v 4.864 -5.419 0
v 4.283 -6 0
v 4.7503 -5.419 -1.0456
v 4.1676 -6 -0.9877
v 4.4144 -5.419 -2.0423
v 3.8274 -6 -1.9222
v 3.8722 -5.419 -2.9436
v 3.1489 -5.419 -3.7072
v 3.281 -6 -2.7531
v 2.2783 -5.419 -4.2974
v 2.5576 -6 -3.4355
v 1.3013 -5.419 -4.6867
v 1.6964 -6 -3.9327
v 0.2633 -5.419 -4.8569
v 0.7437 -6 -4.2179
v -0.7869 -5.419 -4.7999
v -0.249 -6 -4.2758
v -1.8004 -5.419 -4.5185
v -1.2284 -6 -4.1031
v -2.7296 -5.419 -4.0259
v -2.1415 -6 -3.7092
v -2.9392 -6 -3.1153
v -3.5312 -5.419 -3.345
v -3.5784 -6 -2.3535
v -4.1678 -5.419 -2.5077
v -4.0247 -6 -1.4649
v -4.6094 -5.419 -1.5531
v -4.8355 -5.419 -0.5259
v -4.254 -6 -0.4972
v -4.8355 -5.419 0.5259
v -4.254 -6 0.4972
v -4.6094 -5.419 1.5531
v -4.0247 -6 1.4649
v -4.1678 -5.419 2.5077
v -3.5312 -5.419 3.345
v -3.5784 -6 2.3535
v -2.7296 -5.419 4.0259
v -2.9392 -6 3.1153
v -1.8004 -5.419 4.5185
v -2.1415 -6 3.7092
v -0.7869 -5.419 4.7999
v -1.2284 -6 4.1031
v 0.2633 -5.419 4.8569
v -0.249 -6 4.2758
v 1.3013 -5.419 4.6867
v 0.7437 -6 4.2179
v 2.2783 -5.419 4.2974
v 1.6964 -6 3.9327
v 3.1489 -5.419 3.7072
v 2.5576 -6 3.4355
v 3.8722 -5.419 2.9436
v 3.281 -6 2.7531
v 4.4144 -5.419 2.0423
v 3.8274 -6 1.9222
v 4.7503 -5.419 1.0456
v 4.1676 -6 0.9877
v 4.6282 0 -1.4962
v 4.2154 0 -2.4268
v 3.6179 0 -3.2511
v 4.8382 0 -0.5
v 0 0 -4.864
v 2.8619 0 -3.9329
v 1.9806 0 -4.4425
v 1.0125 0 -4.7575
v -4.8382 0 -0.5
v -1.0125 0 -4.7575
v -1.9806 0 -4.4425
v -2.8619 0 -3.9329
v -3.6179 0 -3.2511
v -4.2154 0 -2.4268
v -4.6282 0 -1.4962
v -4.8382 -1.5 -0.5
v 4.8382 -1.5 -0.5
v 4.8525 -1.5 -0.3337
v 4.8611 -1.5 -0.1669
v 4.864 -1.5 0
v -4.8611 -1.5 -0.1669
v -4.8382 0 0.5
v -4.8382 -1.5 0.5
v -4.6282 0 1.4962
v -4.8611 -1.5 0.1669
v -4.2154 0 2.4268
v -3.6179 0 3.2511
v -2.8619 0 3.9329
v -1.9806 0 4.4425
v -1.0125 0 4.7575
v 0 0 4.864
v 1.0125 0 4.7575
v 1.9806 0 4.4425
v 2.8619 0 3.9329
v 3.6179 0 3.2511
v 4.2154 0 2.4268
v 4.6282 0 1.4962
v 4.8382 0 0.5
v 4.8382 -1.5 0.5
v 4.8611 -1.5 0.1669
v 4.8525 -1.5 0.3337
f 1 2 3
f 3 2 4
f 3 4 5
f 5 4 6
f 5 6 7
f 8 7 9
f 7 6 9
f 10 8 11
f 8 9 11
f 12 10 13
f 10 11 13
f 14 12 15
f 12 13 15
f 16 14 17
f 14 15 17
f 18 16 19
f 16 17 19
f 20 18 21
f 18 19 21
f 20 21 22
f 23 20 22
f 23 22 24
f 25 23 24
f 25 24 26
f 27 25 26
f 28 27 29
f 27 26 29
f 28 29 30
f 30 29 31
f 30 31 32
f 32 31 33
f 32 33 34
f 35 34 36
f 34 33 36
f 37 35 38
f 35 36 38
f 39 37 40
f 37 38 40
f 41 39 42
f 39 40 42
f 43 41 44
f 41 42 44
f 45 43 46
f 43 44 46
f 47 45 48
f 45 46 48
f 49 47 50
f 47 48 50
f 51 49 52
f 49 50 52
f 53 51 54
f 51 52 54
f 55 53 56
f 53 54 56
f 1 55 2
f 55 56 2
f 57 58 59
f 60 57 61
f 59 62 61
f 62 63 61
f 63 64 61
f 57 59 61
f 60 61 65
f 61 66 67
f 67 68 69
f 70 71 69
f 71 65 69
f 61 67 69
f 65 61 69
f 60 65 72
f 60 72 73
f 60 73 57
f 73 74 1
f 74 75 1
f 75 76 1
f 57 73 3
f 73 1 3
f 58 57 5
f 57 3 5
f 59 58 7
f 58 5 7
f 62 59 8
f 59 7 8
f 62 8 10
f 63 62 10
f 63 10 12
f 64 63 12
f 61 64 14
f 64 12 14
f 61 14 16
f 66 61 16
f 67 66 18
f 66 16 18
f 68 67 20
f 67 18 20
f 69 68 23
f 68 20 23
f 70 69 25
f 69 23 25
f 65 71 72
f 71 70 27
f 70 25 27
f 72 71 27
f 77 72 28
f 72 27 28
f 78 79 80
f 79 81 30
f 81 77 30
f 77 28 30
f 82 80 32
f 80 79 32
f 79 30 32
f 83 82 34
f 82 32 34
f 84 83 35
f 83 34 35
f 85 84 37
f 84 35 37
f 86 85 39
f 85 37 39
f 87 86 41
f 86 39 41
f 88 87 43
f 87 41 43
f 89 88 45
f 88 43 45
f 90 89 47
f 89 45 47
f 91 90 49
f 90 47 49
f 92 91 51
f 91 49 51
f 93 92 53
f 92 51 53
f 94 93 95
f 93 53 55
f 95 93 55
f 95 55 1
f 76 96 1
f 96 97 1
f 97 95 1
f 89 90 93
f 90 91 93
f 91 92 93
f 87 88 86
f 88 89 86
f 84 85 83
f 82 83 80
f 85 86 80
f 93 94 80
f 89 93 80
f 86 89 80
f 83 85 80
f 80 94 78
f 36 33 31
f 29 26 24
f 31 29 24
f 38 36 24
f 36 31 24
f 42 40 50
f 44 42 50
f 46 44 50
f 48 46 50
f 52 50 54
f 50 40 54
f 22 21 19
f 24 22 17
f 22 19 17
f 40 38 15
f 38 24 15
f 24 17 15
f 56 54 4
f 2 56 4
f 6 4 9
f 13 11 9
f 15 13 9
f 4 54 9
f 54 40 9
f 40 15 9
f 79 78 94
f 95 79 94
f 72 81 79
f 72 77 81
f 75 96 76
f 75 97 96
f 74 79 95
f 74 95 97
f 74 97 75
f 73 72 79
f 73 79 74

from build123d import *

# Parameters (mm, degrees)
SKETCH2_W          = 9.728
SKETCH2_H          = 1
CUT_EXTRUDE1_DEPTH = 1.5


with BuildPart() as part:
    # Sketch1 → Revolve1 (revolve)
    with BuildSketch(Plane.XY):
        Polygon((0, 0), (4.864, 0), (4.864, -5.419), (4.283, -6), (0, -6), align=None)
    revolve(axis=Axis((0, -6, 0), (0, 1, 0)))

    # Sketch2 → Cut-Extrude1 (cut)
    with BuildSketch(Plane(origin=(0, 0, 0), x_dir=(1, 0, 0), z_dir=(0, 1, 0))):
        Rectangle(SKETCH2_W, SKETCH2_H)
    extrude(amount=-CUT_EXTRUDE1_DEPTH, mode=Mode.SUBTRACT)


solid = part.part
